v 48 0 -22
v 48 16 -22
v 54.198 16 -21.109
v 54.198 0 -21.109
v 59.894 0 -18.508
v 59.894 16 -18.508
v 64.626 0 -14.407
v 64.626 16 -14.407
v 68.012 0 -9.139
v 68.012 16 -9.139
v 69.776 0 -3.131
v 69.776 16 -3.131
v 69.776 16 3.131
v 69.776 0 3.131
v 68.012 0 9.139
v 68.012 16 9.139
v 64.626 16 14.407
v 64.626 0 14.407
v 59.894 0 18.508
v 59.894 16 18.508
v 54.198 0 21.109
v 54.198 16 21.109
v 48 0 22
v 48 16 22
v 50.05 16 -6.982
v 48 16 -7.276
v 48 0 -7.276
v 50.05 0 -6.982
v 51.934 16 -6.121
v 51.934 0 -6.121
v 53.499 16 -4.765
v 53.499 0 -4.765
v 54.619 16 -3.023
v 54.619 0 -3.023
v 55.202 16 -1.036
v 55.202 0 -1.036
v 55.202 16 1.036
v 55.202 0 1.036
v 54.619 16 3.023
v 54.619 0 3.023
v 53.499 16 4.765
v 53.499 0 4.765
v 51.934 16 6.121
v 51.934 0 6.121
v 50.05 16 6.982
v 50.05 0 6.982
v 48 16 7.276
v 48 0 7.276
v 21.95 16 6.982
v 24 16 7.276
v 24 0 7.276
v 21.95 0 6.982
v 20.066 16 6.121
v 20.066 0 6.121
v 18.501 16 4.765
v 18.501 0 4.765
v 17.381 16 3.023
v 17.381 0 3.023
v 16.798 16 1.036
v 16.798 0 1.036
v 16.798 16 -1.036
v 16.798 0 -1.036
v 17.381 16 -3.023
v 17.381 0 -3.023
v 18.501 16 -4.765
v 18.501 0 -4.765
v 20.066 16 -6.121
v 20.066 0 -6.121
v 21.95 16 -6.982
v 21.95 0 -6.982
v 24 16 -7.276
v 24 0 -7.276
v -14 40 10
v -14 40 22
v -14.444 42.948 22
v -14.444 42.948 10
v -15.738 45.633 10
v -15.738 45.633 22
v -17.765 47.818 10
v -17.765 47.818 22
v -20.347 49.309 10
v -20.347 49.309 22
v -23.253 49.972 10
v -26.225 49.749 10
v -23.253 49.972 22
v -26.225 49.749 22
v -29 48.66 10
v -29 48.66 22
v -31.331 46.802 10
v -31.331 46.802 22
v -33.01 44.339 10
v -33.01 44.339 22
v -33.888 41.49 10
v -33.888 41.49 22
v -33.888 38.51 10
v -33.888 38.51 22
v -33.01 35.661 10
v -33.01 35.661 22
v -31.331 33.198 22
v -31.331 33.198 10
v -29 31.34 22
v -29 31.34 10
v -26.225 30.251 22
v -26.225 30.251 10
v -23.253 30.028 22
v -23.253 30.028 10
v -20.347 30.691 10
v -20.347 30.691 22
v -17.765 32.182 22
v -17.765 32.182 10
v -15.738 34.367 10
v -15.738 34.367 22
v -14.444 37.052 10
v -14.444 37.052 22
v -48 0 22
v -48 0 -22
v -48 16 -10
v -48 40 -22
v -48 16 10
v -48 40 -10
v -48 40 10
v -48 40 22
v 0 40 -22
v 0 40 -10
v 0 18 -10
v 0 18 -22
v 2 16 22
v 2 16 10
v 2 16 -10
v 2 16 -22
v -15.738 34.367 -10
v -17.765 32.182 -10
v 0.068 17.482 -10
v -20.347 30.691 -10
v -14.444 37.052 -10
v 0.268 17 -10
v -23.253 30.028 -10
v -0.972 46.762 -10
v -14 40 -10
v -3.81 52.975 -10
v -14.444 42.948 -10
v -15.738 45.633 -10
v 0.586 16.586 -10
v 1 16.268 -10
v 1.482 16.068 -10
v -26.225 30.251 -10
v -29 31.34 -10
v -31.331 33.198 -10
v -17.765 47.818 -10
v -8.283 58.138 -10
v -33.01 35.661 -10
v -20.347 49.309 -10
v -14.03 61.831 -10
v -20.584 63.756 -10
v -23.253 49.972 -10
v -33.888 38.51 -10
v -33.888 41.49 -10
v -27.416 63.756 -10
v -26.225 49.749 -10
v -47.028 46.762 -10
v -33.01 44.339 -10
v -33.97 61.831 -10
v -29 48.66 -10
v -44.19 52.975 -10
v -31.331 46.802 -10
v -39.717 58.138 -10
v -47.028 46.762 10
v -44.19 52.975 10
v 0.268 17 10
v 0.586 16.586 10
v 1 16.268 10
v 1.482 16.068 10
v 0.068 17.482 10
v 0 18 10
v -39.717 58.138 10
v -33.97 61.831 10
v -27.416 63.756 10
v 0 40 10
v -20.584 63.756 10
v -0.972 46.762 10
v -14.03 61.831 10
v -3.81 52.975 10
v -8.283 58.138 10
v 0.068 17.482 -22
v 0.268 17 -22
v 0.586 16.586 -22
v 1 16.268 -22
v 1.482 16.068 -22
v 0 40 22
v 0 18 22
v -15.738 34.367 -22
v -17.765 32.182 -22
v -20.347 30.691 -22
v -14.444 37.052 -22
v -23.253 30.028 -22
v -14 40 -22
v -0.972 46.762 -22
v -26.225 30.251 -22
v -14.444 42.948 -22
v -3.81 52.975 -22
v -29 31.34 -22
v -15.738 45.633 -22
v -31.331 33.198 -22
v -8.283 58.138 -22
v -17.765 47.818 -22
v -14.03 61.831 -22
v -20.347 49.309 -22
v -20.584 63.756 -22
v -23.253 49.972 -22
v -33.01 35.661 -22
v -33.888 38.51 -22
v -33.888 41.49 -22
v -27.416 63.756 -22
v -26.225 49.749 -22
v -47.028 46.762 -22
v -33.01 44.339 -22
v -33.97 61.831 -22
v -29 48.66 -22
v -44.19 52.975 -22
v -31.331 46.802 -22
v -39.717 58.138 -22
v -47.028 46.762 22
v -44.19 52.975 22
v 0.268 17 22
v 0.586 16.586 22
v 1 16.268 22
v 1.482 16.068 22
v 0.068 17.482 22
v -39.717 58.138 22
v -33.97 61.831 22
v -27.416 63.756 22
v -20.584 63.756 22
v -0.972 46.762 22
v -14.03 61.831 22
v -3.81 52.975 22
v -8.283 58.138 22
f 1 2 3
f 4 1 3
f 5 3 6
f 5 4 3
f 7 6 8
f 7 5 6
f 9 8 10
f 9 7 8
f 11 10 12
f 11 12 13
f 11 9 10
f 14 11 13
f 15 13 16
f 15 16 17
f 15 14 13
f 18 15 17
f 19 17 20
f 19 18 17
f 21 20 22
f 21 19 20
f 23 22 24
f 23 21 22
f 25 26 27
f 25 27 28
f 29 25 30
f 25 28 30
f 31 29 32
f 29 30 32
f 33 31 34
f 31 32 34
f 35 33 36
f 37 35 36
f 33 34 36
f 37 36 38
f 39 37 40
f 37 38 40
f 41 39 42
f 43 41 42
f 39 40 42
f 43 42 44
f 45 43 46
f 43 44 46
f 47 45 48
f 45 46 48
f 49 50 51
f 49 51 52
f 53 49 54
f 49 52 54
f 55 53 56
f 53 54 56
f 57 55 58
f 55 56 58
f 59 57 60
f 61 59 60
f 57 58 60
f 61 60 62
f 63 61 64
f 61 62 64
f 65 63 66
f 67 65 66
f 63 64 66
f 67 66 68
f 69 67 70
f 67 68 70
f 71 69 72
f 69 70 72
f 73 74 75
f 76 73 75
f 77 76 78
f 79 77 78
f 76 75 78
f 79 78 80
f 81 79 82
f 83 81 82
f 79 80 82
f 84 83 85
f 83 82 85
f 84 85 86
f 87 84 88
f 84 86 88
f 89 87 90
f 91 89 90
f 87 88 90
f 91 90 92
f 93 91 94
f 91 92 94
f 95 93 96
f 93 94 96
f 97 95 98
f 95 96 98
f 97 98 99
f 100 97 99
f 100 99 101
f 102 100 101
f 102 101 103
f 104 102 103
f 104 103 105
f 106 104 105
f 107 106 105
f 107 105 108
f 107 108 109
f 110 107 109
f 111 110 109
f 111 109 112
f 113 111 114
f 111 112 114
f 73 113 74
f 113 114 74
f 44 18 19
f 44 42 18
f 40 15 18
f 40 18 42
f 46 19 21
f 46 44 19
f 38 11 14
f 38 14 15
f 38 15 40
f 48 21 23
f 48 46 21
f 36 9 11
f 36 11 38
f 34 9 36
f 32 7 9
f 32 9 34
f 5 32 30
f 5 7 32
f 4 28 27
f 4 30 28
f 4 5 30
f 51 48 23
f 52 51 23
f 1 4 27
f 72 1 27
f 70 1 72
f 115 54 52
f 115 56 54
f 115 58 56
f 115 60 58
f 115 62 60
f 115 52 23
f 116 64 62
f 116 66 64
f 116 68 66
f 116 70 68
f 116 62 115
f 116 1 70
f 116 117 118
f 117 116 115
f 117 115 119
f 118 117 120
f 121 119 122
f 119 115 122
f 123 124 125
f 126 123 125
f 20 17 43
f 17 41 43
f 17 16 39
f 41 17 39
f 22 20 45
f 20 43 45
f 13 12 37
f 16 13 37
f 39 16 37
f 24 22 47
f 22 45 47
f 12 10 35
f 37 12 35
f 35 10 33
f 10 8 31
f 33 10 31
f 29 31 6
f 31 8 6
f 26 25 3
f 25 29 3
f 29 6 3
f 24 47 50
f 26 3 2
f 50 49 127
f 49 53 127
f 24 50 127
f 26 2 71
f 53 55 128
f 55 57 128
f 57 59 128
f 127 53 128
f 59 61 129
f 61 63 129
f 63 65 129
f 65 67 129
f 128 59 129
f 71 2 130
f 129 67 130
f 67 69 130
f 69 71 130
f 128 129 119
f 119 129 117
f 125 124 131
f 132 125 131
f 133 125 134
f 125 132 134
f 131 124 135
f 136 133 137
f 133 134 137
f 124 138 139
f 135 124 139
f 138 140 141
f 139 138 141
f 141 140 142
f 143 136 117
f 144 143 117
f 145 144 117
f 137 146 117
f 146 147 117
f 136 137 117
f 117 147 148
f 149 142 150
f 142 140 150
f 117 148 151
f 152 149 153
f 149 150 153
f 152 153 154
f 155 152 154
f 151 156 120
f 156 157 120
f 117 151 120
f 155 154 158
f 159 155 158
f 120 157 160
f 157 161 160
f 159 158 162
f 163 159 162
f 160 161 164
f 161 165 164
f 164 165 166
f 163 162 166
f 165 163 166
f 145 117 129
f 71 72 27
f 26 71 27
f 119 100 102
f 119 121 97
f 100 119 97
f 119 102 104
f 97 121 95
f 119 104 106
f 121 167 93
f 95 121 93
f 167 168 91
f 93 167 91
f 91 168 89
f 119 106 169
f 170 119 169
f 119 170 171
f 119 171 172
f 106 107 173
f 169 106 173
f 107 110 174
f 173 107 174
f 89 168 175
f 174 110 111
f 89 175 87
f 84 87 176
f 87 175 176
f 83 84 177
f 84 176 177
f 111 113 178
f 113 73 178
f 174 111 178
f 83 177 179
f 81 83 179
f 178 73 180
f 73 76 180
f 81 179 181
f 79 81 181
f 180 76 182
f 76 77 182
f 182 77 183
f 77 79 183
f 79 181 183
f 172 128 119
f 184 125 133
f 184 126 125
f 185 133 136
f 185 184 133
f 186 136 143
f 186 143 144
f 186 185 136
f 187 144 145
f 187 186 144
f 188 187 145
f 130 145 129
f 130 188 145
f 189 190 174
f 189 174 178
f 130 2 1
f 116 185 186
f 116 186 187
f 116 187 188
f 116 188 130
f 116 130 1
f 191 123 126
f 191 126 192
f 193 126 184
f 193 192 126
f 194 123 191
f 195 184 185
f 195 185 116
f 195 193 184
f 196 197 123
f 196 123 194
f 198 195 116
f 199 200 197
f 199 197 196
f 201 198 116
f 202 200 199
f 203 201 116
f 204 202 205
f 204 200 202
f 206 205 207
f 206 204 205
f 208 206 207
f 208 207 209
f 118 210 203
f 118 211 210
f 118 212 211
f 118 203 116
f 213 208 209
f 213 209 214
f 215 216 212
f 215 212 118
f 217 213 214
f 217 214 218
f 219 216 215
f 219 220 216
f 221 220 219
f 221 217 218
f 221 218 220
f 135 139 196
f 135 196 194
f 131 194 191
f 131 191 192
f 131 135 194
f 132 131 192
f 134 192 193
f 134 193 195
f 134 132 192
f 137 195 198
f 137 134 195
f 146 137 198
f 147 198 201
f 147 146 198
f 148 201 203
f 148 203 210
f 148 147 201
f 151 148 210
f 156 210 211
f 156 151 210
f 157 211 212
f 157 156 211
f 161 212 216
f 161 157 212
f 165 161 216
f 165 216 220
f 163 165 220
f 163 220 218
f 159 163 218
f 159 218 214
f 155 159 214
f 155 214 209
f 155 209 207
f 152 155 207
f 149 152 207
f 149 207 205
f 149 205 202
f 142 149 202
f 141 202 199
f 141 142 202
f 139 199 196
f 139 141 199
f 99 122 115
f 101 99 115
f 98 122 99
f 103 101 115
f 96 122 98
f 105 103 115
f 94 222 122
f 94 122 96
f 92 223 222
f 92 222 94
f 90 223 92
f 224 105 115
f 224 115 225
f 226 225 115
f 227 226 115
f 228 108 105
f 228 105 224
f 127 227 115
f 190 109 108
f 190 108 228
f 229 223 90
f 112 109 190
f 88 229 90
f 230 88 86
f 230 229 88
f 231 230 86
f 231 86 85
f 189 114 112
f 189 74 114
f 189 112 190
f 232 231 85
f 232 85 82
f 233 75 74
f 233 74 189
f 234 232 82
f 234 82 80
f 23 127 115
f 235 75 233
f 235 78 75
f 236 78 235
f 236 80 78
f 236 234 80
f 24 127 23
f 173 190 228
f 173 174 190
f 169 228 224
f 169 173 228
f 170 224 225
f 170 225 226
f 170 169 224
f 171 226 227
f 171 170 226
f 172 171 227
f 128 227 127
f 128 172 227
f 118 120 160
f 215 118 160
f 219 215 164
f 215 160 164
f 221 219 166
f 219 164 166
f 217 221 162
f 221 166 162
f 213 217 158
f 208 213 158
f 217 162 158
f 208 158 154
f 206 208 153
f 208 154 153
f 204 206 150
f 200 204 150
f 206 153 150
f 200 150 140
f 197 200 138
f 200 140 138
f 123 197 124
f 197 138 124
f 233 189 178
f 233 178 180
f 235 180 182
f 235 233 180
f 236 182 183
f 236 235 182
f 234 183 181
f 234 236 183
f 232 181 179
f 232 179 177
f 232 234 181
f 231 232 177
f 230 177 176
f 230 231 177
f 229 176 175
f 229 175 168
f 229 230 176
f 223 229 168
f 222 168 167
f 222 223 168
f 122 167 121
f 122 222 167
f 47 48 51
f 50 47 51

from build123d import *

# Parameters (mm, degrees)
BOSS_EXTRUDE1_DEPTH = 16
CUT_EXTRUDE2_DEPTH  = 16
SKETCH3_R           = 10
BOSS_EXTRUDE2_DEPTH = 12
BOSS_EXTRUDE3_START = -12
SKETCH11_R          = 10
BOSS_EXTRUDE3_DEPTH = 12
FILLET1_R           = 2
FILLET2_R           = 2


with BuildPart() as part:
    # Sketch1 → Boss-Extrude1 (new body)
    with BuildSketch(Plane(origin=(0, 0, 0), x_dir=(1, 0, 0), z_dir=(0, 1, 0))):
        with BuildLine():
            Line((-48, 22), (48, 22))
            ThreePointArc((48, 22), (70, 0), (48, -22))
            Line((48, -22), (-48, -22))
            Line((-48, -22), (-48, 22))
        make_face()
    extrude(amount=BOSS_EXTRUDE1_DEPTH)

    # Sketch2 → Cut-Extrude2 (cut)
    with BuildSketch(Plane(origin=(0, 0, 0), x_dir=(1, 0, 0), z_dir=(0, 1, 0))):
        with BuildLine():
            Line((48, -7.276334806), (24, -7.276334806))
            ThreePointArc((24, -7.276334806), (16.723665194, 0), (24, 7.276334806))
            Line((24, 7.276334806), (48, 7.276334806))
            ThreePointArc((48, 7.276334806), (55.276334806, 0), (48, -7.276334806))
        make_face()
    extrude(amount=CUT_EXTRUDE2_DEPTH, mode=Mode.SUBTRACT)

    # Sketch3 → Boss-Extrude2 (add)
    with BuildSketch(Plane.XY.offset(22)):
        with BuildLine():
            Line((-48, 40), (-48, 16))
            Line((-48, 16), (0, 16))
            Line((0, 16), (0, 40))
            ThreePointArc((0, 40), (-24, 64), (-48, 40))
        make_face()
        with Locations((-24, 40)):
            Circle(SKETCH3_R, mode=Mode.SUBTRACT)
    extrude(amount=-BOSS_EXTRUDE2_DEPTH)

    # Sketch11 → Boss-Extrude3 (add)
    with BuildSketch(Plane(origin=(0, 0, -22), x_dir=(-1, 0, 0), z_dir=(0, 0, -1)).offset(BOSS_EXTRUDE3_START)):
        with BuildLine():
            Line((0, 16), (48, 16))
            Line((48, 16), (48, 40))
            ThreePointArc((48, 40), (24, 64), (0, 40))
            Line((0, 40), (0, 16))
        make_face()
        with Locations(Location((24, 40, 0), (0, 0, 180))):
            Circle(SKETCH11_R, mode=Mode.SUBTRACT)
    extrude(amount=BOSS_EXTRUDE3_DEPTH)

    # Fillet1
    fillet1_edges = [part.edges().sort_by_distance(p)[0] for p in [
        (0, 16, 16),
    ]]
    fillet(fillet1_edges, radius=FILLET1_R)

    # Fillet2
    fillet2_edges = [part.edges().sort_by_distance(p)[0] for p in [
        (0, 16, -16),
    ]]
    fillet(fillet2_edges, radius=FILLET2_R)


solid = part.part
